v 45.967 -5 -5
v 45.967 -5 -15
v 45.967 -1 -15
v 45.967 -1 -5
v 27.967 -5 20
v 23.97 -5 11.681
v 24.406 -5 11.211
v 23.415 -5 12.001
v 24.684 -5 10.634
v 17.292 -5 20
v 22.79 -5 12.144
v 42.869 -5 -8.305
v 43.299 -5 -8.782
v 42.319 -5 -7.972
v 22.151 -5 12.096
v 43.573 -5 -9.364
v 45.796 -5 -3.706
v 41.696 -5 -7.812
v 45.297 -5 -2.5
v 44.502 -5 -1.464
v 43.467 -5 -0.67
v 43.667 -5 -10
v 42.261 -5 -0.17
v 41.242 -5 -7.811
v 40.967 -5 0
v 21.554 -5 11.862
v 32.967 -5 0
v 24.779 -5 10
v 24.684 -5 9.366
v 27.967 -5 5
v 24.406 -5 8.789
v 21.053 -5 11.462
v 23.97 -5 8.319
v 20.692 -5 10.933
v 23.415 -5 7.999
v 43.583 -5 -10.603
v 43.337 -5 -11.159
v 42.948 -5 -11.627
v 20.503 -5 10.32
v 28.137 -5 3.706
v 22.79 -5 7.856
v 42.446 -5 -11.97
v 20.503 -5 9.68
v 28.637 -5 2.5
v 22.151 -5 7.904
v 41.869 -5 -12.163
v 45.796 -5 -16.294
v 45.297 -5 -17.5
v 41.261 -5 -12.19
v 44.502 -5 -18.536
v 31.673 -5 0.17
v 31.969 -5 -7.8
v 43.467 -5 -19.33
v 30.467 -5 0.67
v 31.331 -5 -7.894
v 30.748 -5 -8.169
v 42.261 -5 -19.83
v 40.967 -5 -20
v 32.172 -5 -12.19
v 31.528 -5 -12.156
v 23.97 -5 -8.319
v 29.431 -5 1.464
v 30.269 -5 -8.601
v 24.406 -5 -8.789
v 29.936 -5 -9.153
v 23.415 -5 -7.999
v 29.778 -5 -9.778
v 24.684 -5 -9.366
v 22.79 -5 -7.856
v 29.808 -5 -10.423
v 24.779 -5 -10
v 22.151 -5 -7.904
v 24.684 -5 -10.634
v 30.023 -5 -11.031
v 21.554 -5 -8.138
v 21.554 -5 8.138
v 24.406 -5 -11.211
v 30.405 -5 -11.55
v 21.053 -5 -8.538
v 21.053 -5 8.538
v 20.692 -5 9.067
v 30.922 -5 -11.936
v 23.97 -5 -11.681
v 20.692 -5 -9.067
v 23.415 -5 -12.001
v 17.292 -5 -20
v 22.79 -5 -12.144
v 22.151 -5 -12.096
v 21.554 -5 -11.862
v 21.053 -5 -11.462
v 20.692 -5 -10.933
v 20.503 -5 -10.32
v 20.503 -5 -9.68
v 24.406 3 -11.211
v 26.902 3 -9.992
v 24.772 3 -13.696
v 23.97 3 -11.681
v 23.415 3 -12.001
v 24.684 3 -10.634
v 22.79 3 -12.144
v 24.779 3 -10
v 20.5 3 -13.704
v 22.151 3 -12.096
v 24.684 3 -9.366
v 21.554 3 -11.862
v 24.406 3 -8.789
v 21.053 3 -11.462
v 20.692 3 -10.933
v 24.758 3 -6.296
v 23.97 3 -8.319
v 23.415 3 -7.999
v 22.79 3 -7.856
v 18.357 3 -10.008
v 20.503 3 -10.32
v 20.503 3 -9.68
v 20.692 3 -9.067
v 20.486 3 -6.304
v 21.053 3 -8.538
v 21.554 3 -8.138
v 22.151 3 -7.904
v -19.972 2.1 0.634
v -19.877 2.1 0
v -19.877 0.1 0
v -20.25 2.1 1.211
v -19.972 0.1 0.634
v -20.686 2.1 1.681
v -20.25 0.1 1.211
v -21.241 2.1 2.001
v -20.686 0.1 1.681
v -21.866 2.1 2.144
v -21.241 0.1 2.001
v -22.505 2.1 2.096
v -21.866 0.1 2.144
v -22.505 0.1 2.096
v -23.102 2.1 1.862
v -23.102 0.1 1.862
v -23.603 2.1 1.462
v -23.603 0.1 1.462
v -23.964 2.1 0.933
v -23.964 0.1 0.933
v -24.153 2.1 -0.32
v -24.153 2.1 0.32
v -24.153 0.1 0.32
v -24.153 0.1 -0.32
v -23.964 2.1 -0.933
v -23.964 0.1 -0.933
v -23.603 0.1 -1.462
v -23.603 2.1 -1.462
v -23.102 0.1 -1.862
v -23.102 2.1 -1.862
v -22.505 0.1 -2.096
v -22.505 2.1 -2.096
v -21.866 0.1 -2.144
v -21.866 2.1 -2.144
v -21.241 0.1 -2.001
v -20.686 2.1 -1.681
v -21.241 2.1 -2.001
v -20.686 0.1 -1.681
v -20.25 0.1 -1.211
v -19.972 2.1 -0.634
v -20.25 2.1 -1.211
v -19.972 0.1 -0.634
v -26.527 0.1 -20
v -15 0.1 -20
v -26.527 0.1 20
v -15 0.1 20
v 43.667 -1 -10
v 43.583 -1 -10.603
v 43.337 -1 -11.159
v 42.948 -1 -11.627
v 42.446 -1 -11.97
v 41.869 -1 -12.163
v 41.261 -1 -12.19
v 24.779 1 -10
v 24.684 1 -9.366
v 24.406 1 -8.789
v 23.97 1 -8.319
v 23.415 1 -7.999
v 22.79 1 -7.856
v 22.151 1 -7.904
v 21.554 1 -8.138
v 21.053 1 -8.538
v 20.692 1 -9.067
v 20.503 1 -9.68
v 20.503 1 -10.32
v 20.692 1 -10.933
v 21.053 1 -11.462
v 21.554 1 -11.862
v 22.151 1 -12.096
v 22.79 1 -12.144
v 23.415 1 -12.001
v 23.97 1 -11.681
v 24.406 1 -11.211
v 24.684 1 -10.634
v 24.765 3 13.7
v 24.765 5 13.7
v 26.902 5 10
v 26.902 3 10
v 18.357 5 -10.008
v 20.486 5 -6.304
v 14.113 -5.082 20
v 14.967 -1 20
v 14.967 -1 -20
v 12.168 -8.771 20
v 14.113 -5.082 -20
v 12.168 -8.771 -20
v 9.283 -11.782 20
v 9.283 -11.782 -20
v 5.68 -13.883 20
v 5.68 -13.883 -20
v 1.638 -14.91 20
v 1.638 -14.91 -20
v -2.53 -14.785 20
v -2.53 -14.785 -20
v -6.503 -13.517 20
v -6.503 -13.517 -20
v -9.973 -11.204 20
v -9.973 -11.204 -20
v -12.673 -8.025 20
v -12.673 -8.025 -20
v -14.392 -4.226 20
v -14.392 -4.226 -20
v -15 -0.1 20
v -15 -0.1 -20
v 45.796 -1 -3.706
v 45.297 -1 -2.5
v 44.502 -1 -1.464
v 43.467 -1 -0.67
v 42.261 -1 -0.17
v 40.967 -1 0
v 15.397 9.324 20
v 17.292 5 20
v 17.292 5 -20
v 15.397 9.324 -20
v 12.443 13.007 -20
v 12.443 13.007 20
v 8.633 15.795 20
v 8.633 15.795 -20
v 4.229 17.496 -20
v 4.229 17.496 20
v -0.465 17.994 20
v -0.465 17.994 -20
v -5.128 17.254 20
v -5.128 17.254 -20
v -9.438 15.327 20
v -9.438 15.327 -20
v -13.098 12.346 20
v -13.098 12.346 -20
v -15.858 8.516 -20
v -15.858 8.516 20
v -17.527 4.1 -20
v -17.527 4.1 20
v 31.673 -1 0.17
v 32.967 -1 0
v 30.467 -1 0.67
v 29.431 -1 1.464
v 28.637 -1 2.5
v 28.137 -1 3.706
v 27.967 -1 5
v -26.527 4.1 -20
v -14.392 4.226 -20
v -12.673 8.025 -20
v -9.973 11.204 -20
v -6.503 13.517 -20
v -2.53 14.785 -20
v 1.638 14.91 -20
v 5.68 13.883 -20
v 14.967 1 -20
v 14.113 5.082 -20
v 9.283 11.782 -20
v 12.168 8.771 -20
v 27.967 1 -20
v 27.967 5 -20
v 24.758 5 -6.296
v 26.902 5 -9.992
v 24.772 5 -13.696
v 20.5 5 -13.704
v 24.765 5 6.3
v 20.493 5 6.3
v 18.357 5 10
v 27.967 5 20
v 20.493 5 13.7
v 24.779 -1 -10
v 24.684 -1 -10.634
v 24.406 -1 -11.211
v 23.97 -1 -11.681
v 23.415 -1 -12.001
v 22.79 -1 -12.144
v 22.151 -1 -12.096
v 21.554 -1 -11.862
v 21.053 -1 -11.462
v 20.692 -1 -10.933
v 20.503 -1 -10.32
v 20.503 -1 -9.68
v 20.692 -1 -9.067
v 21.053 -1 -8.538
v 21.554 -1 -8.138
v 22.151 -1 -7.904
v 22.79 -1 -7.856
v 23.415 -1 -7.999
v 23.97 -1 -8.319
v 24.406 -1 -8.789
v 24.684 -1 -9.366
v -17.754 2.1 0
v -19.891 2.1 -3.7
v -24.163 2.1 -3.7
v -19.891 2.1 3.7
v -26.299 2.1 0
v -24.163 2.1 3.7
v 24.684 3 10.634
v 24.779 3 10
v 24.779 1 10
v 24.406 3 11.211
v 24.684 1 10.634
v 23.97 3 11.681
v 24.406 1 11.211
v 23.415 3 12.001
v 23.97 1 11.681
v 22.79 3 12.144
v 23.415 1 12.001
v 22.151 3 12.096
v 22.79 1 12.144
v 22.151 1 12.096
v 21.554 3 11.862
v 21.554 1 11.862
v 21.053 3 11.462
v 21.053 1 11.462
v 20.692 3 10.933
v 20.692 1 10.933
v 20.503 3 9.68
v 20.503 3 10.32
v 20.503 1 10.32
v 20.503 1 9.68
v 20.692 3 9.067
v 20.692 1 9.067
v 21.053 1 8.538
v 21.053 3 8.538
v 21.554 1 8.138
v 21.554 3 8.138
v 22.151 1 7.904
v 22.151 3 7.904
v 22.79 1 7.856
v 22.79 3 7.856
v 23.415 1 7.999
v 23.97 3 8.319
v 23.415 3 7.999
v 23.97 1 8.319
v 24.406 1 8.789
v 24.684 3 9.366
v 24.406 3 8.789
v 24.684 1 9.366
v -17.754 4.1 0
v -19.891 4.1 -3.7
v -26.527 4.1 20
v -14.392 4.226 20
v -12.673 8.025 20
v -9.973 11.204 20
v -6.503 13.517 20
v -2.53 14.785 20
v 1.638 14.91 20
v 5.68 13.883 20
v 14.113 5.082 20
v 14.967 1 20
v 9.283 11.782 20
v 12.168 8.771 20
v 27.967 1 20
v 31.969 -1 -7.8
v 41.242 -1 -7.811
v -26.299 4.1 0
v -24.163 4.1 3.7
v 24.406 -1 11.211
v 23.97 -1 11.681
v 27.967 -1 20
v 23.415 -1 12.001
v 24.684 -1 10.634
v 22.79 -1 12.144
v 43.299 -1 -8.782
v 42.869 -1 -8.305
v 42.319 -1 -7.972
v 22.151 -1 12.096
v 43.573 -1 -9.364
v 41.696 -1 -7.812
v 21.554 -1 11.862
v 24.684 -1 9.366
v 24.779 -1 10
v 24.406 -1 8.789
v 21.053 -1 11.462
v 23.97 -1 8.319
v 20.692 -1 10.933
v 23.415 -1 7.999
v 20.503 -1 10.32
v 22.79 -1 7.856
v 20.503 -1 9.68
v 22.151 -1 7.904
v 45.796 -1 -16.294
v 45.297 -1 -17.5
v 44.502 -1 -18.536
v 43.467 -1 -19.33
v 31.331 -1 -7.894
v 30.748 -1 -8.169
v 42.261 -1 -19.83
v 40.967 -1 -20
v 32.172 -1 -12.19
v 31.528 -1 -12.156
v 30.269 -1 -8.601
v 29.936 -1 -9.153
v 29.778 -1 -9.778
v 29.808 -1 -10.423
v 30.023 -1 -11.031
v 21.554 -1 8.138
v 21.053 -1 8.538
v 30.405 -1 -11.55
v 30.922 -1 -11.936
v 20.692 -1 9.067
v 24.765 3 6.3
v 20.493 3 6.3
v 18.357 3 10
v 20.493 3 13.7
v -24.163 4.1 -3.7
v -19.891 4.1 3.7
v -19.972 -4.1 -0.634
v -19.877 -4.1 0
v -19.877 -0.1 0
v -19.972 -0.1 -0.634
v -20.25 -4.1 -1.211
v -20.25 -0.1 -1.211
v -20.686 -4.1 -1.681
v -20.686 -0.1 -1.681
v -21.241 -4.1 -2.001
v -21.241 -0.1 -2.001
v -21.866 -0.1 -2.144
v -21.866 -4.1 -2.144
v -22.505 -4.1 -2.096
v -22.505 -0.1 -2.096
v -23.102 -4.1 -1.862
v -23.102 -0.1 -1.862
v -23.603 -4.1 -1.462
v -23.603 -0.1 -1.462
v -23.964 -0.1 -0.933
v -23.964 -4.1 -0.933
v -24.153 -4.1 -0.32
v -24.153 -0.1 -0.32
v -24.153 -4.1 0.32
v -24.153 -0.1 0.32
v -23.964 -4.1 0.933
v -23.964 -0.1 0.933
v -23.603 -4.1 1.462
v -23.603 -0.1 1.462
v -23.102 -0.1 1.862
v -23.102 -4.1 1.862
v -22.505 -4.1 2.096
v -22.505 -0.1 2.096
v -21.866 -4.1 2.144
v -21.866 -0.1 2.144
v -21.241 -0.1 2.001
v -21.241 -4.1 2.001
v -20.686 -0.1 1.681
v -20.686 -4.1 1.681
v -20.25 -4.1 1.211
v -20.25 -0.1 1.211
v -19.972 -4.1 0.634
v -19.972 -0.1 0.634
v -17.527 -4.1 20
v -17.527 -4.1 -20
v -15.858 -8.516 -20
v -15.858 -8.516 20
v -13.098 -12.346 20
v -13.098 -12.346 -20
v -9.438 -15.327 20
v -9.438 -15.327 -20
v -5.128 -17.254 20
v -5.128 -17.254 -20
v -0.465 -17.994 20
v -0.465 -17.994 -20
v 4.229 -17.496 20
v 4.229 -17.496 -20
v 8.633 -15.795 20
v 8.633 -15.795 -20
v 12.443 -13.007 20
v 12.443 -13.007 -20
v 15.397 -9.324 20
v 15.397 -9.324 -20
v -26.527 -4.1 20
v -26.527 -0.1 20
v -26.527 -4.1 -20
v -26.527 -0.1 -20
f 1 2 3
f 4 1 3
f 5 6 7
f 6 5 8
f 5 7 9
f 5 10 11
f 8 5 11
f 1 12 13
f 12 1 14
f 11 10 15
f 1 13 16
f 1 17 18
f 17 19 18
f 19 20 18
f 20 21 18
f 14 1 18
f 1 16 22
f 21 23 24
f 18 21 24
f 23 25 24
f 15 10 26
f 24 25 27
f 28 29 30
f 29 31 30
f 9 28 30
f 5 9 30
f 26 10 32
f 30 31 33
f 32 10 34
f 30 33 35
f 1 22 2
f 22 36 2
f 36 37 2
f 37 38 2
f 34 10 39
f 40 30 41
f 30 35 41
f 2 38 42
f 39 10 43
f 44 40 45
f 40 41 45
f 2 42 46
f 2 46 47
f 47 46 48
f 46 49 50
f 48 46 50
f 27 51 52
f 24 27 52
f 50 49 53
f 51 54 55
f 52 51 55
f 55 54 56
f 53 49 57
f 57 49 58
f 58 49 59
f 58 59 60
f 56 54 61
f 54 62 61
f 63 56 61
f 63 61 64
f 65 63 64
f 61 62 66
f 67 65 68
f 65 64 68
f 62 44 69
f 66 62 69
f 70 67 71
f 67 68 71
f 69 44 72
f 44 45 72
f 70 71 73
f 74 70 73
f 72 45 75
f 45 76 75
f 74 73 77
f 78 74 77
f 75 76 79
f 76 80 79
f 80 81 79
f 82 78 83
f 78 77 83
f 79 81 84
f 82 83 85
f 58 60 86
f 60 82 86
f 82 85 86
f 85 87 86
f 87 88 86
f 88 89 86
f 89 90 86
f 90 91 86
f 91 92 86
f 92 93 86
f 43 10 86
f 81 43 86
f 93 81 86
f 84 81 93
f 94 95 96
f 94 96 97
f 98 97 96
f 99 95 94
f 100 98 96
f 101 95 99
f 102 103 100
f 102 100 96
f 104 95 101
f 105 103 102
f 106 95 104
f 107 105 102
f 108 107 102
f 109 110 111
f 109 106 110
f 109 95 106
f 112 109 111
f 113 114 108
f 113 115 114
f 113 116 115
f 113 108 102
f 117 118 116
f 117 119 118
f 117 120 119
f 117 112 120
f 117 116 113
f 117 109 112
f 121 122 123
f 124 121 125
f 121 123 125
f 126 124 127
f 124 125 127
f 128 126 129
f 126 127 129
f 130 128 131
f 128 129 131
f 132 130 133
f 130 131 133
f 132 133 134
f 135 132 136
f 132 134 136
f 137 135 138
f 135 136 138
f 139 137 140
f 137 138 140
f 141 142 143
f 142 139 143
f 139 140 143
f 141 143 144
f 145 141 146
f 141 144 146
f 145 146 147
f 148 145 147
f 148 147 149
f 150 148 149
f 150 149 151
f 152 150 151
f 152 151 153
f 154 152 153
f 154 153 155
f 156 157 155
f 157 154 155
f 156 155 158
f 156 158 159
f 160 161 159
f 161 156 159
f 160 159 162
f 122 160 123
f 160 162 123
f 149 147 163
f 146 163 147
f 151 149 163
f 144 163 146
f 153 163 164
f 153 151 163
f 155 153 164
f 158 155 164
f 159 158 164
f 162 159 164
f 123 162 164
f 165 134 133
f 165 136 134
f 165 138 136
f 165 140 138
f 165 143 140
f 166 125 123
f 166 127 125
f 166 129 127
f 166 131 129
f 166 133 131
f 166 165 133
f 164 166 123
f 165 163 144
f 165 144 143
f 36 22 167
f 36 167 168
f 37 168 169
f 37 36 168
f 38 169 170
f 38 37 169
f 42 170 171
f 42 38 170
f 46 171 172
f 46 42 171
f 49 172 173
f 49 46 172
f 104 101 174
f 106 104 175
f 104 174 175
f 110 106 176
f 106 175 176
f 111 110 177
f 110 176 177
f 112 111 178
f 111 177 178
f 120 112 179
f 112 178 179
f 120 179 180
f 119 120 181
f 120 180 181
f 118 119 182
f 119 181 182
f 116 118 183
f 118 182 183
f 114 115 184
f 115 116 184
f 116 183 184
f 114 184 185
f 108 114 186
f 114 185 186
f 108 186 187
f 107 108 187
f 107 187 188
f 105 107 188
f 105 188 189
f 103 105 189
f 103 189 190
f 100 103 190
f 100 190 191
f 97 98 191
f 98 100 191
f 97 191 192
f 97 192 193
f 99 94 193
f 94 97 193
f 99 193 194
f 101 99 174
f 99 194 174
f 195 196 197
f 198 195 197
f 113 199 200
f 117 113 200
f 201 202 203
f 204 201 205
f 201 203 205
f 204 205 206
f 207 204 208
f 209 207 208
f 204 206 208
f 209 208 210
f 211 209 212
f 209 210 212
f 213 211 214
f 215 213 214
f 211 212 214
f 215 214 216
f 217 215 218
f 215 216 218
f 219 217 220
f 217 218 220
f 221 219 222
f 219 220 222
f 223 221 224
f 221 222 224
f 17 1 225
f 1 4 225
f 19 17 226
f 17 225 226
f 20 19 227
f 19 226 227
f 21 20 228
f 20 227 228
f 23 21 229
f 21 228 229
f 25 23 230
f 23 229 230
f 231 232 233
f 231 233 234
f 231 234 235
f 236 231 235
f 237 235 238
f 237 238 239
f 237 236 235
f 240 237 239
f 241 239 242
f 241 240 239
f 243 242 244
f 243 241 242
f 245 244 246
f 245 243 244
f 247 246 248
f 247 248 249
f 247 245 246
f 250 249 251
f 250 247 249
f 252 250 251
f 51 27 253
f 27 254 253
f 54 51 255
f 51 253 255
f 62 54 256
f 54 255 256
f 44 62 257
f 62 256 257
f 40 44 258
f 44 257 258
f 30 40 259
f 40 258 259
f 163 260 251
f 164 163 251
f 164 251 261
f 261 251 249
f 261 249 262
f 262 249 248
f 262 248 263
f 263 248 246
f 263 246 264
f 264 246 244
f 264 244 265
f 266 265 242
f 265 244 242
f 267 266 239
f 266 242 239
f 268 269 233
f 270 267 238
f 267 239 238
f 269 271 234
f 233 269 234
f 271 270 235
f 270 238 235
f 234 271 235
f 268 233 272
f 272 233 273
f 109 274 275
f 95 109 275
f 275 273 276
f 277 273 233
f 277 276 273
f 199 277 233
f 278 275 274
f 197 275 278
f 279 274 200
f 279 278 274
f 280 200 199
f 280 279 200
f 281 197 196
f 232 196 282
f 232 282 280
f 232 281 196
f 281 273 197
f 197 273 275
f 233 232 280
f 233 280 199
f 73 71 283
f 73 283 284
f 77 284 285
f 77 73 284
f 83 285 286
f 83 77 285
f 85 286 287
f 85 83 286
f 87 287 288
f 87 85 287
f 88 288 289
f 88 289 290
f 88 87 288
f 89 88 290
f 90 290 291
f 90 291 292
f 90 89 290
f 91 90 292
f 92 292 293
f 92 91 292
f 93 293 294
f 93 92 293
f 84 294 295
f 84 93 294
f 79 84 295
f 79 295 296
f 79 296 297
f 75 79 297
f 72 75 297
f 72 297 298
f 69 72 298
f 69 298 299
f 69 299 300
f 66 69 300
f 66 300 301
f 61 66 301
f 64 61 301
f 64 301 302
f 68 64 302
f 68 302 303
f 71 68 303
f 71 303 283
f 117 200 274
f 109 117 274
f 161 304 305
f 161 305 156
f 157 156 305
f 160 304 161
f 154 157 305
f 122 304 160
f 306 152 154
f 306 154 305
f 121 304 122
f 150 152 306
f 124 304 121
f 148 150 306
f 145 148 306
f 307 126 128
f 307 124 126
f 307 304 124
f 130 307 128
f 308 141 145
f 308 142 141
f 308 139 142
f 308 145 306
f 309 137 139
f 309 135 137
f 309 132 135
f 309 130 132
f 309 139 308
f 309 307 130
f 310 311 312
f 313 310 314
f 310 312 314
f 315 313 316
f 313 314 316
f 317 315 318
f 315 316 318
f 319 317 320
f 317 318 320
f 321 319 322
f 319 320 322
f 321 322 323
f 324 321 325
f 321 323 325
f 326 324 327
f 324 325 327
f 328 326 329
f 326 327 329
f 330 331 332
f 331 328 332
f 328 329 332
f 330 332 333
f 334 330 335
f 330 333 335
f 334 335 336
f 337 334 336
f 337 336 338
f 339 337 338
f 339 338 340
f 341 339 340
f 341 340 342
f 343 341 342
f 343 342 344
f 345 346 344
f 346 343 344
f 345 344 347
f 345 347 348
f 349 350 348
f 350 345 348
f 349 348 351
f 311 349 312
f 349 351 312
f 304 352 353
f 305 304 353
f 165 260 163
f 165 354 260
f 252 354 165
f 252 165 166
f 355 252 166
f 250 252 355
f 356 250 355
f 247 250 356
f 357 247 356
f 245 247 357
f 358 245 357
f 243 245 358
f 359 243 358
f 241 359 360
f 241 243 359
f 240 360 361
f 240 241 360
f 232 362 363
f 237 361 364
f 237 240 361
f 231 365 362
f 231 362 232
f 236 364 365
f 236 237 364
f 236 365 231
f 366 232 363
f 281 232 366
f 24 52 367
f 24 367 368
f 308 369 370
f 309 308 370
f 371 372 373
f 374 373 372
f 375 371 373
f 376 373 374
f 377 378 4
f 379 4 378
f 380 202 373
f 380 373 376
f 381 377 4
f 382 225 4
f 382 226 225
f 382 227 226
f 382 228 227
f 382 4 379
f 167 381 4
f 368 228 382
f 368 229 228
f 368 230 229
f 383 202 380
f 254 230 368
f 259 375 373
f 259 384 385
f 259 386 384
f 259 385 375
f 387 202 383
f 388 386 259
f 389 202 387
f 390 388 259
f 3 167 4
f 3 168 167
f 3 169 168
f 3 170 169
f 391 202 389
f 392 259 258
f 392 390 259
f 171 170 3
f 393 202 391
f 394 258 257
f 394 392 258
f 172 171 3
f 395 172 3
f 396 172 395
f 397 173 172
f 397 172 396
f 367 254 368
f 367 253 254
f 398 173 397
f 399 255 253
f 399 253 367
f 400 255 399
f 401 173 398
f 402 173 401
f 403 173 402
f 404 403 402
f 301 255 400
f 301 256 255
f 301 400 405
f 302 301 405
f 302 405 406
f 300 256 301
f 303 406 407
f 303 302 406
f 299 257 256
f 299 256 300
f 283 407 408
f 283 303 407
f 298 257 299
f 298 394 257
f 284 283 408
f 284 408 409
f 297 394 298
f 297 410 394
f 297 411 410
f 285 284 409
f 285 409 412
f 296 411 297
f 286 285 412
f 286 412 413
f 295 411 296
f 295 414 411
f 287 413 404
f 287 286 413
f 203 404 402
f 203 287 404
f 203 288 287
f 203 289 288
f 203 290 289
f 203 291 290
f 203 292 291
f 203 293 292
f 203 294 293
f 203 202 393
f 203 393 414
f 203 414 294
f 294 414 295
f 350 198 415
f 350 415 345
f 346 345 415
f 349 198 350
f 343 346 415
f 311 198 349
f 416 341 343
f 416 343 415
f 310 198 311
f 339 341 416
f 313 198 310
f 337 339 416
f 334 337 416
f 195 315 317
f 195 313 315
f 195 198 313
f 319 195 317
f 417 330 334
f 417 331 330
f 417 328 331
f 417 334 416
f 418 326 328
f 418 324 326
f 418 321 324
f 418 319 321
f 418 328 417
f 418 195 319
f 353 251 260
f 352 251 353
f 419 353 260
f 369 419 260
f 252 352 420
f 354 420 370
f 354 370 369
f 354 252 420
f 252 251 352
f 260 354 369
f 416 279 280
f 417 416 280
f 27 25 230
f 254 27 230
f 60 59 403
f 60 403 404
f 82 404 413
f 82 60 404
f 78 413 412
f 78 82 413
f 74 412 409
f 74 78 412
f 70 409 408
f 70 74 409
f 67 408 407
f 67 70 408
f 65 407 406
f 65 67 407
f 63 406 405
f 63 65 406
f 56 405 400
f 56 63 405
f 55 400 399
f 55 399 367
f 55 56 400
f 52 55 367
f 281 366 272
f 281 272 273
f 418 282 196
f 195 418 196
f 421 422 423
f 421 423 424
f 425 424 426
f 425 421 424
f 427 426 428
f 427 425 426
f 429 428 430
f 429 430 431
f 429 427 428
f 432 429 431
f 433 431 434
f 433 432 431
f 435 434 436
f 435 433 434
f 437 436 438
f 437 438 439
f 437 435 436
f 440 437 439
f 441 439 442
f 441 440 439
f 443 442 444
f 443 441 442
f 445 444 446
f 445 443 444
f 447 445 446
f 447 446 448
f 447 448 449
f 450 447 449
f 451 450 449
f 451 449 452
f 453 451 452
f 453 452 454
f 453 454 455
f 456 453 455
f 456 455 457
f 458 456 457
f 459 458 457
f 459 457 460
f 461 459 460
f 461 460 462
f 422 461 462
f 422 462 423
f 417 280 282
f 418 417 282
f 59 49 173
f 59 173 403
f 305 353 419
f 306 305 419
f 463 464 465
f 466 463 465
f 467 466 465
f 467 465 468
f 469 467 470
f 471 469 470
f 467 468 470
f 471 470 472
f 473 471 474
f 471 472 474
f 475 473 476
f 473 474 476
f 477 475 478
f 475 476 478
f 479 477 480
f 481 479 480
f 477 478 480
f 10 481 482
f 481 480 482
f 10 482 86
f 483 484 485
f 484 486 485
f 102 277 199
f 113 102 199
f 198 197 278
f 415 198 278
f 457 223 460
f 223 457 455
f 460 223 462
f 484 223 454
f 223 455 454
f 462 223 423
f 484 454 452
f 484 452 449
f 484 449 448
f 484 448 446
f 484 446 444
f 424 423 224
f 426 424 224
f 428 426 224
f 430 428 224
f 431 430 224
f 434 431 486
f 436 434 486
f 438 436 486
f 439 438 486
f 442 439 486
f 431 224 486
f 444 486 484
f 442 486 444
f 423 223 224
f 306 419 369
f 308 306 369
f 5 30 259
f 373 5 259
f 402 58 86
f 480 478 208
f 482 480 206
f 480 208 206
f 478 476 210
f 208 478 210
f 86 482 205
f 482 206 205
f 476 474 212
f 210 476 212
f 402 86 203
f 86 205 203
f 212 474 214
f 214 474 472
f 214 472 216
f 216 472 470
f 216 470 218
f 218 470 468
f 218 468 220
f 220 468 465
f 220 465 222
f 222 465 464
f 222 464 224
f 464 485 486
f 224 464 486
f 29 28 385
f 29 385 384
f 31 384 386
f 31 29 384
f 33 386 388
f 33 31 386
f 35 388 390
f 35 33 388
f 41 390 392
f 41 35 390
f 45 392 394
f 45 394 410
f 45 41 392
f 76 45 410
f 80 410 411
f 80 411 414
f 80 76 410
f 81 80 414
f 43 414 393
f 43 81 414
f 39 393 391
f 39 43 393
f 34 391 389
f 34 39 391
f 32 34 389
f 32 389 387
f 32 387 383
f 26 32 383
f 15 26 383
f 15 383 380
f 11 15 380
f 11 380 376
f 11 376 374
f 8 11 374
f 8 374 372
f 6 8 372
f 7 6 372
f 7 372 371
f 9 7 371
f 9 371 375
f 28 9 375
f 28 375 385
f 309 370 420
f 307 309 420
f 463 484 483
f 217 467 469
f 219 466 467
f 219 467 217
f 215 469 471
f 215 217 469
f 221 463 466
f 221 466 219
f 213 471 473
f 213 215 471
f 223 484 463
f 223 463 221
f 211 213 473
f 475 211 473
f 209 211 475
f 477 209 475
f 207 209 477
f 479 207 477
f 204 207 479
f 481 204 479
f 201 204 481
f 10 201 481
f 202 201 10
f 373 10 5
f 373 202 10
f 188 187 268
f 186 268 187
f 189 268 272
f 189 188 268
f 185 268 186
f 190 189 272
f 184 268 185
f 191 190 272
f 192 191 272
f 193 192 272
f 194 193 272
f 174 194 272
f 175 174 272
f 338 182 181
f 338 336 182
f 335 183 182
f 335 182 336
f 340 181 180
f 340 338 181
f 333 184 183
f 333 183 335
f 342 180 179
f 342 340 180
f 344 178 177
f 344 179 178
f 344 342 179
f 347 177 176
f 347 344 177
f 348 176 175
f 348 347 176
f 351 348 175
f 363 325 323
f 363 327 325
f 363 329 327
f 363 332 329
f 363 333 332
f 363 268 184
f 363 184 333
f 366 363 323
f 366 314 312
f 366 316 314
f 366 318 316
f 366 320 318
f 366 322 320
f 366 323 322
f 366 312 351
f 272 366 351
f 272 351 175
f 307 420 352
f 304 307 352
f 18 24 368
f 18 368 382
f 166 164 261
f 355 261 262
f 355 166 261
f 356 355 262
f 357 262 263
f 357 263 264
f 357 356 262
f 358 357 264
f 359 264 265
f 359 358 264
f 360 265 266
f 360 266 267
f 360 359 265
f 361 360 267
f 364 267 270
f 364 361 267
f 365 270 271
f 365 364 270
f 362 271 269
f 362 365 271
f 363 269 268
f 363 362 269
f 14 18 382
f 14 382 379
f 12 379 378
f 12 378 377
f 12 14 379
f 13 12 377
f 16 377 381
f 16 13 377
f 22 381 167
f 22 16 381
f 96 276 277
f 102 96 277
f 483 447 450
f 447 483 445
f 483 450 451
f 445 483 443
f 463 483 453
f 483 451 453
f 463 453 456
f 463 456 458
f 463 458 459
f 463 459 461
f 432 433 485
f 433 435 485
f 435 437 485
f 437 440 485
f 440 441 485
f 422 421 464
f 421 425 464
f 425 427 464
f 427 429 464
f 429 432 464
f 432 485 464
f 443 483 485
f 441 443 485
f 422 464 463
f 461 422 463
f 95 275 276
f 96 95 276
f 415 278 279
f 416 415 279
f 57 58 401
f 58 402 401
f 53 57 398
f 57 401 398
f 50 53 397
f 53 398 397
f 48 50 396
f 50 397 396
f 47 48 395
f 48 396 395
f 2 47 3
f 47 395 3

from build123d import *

# Parameters (mm, degrees)
F1_DEPTH  = 20
F2_R      = 2.15
F3_DEPTH  = 25
F4_R      = 2.15
F5_DEPTH  = 2
F6_R      = 2.15
F7_DEPTH  = 25
F8_R      = 2.15
F9_DEPTH  = 2
F10_W     = 4
F10_H     = 20
F11_DEPTH = 18
F12_R     = 5
F14_DEPTH = 25
F17_R     = 5


with BuildPart() as f1:
    # F0 (on Top) → F1 (new body, symmetric)
    with BuildSketch(Plane.XY):
        with BuildLine():
            ThreePointArc((-14.999666663, 0.1), (-0.4503030788, 14.993239381), (14.9666295471, 1))
            Line((14.9666295471, 1), (17.9722007556, 1))
            ThreePointArc((17.9722007556, 1), (17.7449767894, 3.0192381065), (17.2916164658, 5))
            ThreePointArc((17.2916164658, 5), (-0.4651151727, 17.9939897709), (-17.5268365657, 4.1))
            ThreePointArc((-17.5268365657, 4.1), (-17.87551663, 2.1132688448), (-17.9997222201, 0.1))
            Line((-17.9997222201, 0.1), (-14.999666663, 0.1))
        make_face()
        with BuildLine():
            Line((-26.5268365657, 0.1), (-17.9997222201, 0.1))
            ThreePointArc((-17.9997222201, 0.1), (-17.87551663, 2.1132688448), (-17.5268365657, 4.1))
            Line((-17.5268365657, 4.1), (-26.5268365657, 4.1))
            Line((-26.5268365657, 4.1), (-26.5268365657, 0.1))
        make_face()
        with BuildLine():
            ThreePointArc((17.2916164658, 5), (17.7449767894, 3.0192381065), (17.9722007556, 1))
            Line((17.9722007556, 1), (27.9666295471, 1))
            Line((27.9666295471, 1), (27.9666295471, 5))
            Line((27.9666295471, 5), (17.2916164658, 5))
        make_face()
    extrude(amount=F1_DEPTH, both=True)


with BuildPart() as f1b:
    # F0 (on Top) → F1, piece 2 (new body, symmetric)
    with BuildSketch(Plane.XY):
        with BuildLine():
            ThreePointArc((-17.5268365657, -4.1), (-17.87551663, -2.1132688448), (-17.9997222201, -0.1))
            Line((-17.9997222201, -0.1), (-26.5268365657, -0.1))
            Line((-26.5268365657, -0.1), (-26.5268365657, -4.1))
            Line((-26.5268365657, -4.1), (-17.5268365657, -4.1))
        make_face()
        with BuildLine():
            Line((17.9722007556, -1), (14.9666295471, -1))
            ThreePointArc((14.9666295471, -1), (-0.4503030788, -14.993239381), (-14.999666663, -0.1))
            Line((-14.999666663, -0.1), (-17.9997222201, -0.1))
            ThreePointArc((-17.9997222201, -0.1), (-17.87551663, -2.1132688448), (-17.5268365657, -4.1))
            ThreePointArc((-17.5268365657, -4.1), (-0.4651151727, -17.9939897709), (17.2916164658, -5))
            ThreePointArc((17.2916164658, -5), (17.7449767894, -3.0192381065), (17.9722007556, -1))
        make_face()
        with BuildLine():
            Line((27.9666295471, -1), (17.9722007556, -1))
            ThreePointArc((17.9722007556, -1), (17.7449767894, -3.0192381065), (17.2916164658, -5))
            Line((17.2916164658, -5), (27.9666295471, -5))
            Line((27.9666295471, -5), (27.9666295471, -1))
        make_face()
    extrude(amount=F1_DEPTH, both=True)


with BuildPart() as f3_tool:
    # F2 (on face) → F3 (new body)
    with BuildSketch(Plane.XZ.offset(4.1)):
        with Locations((-22.0268365657, 0)):
            Circle(F2_R)
    extrude(amount=-F3_DEPTH)


with BuildPart() as f1_1:
    add(f1.part)

    # F3: cut by f3_tool
    add(f3_tool.part, mode=Mode.SUBTRACT)

    # F4 (on face) → F5 (cut)
    with BuildSketch(Plane(origin=(0, 4.1, 0), x_dir=(-1, 0, 0), z_dir=(0, 1, 0))):
        Polygon((24.1630325617, 3.7), (19.8906405697, 3.7), (17.7544445737, 0), (19.8906405697, -3.7), (24.1630325617, -3.7), (26.2992285577, 0), align=None)
        with Locations((22.0268365657, 0)):
            Circle(F4_R, mode=Mode.SUBTRACT)
    extrude(amount=-F5_DEPTH, mode=Mode.SUBTRACT)


with BuildPart() as f1b_1:
    add(f1b.part)

    # F3: cut by f3_tool
    add(f3_tool.part, mode=Mode.SUBTRACT)


with BuildPart() as f7_tool:
    # F6 (on face) → F7 (new body)
    with BuildSketch(Plane.XZ.offset(5)):
        with Locations((22.6291230064, 10)):
            Circle(F6_R)
        with Locations((22.6291230064, -10)):
            Circle(F6_R)
    extrude(amount=-F7_DEPTH)


with BuildPart() as f1_2:
    add(f1_1.part)

    # F7: cut by f7_tool
    add(f7_tool.part, mode=Mode.SUBTRACT)

    # F8 (on face) → F9 (cut)
    with BuildSketch(Plane(origin=(0, 5, 0), x_dir=(-1, 0, 0), z_dir=(0, 1, 0))):
        Polygon((-20.4929270104, 13.7), (-24.7653190024, 13.7), (-26.9015149984, 10), (-24.7653190024, 6.3), (-20.4929270104, 6.3), (-18.3567310144, 10), align=None)
        with Locations((-22.6291230064, 10)):
            Circle(F8_R, mode=Mode.SUBTRACT)
        Polygon((-20.4858813267, -6.3040767817), (-24.758265564, -6.2959366497), (-26.9015072438, -9.991859868), (-24.7723646862, -13.6959232183), (-20.4999804488, -13.7040633503), (-18.3567387691, -10.008140132), align=None)
        with Locations((-22.6291230064, -10)):
            Circle(F8_R, mode=Mode.SUBTRACT)
    extrude(amount=-F9_DEPTH, mode=Mode.SUBTRACT)


with BuildPart() as f1b_2:
    add(f1b_1.part)

    # F7: cut by f7_tool
    add(f7_tool.part, mode=Mode.SUBTRACT)

    # F10 (on face) → F11 (join)
    with BuildSketch(Plane.YZ.offset(27.9666295471)):
        with Locations((-3, 10)):
            Rectangle(F10_W, F10_H)
    extrude(amount=F11_DEPTH)

    # F12
    f12_edges = [f1b_2.edges().sort_by_distance(p)[0] for p in [
        (45.96663, -3, 20),
        (45.96663, -3, 0),
    ]]
    fillet(f12_edges, radius=F12_R)

    # F13 (on face) → F14 (cut)
    with BuildSketch(Plane.XZ.offset(5)):
        with BuildLine():
            ThreePointArc((31.9693457589, 7.8000016768), (33.5232244954, 8.4453257039), (34.1666295471, 10))
            ThreePointArc((34.1666295471, 10), (33.5934159099, 11.4810692522), (32.1724785199, 12.1903484199))
            ThreePointArc((32.1724785199, 12.1903484199), (29.7689805783, 10.1016809216), (31.9693457589, 7.8000016768))
        make_face()
        with BuildLine():
            ThreePointArc((43.6666295471, 10), (42.9476987993, 11.6267863628), (41.2607805742, 12.1903484199))
            ThreePointArc((41.2607805742, 12.1903484199), (39.2666488008, 10.0092041272), (41.2424604448, 7.81145066))
            Line((41.2424604448, 7.81145066), (41.6962021106, 7.8120108688))
            ThreePointArc((41.6962021106, 7.8120108688), (43.1014169399, 8.5277669409), (43.6666295471, 10))
        make_face()
        with BuildLine():
            ThreePointArc((32.1724785199, 12.1903484199), (33.5934159099, 11.4810692522), (34.1666295471, 10))
            ThreePointArc((34.1666295471, 10), (33.5232244954, 8.4453257039), (31.9693457589, 7.8000016768))
            Line((31.9693457589, 7.8000016768), (41.2424604448, 7.81145066))
            ThreePointArc((41.2424604448, 7.81145066), (39.2666488008, 10.0092041272), (41.2607805742, 12.1903484199))
            Line((41.2607805742, 12.1903484199), (32.1724785199, 12.1903484199))
        make_face()
    extrude(amount=-F14_DEPTH, mode=Mode.SUBTRACT)


with BuildPart() as f15_1:
    # F15: instance of F1b
    add(f1b_2.part.mirror(Plane.XY))

    # F17
    f17_edges = [f15_1.edges().sort_by_distance(p)[0] for p in [
        (27.96663, -3, 0),
    ]]
    fillet(f17_edges, radius=F17_R)


solid = Compound([f1_2.part, f15_1.part])
